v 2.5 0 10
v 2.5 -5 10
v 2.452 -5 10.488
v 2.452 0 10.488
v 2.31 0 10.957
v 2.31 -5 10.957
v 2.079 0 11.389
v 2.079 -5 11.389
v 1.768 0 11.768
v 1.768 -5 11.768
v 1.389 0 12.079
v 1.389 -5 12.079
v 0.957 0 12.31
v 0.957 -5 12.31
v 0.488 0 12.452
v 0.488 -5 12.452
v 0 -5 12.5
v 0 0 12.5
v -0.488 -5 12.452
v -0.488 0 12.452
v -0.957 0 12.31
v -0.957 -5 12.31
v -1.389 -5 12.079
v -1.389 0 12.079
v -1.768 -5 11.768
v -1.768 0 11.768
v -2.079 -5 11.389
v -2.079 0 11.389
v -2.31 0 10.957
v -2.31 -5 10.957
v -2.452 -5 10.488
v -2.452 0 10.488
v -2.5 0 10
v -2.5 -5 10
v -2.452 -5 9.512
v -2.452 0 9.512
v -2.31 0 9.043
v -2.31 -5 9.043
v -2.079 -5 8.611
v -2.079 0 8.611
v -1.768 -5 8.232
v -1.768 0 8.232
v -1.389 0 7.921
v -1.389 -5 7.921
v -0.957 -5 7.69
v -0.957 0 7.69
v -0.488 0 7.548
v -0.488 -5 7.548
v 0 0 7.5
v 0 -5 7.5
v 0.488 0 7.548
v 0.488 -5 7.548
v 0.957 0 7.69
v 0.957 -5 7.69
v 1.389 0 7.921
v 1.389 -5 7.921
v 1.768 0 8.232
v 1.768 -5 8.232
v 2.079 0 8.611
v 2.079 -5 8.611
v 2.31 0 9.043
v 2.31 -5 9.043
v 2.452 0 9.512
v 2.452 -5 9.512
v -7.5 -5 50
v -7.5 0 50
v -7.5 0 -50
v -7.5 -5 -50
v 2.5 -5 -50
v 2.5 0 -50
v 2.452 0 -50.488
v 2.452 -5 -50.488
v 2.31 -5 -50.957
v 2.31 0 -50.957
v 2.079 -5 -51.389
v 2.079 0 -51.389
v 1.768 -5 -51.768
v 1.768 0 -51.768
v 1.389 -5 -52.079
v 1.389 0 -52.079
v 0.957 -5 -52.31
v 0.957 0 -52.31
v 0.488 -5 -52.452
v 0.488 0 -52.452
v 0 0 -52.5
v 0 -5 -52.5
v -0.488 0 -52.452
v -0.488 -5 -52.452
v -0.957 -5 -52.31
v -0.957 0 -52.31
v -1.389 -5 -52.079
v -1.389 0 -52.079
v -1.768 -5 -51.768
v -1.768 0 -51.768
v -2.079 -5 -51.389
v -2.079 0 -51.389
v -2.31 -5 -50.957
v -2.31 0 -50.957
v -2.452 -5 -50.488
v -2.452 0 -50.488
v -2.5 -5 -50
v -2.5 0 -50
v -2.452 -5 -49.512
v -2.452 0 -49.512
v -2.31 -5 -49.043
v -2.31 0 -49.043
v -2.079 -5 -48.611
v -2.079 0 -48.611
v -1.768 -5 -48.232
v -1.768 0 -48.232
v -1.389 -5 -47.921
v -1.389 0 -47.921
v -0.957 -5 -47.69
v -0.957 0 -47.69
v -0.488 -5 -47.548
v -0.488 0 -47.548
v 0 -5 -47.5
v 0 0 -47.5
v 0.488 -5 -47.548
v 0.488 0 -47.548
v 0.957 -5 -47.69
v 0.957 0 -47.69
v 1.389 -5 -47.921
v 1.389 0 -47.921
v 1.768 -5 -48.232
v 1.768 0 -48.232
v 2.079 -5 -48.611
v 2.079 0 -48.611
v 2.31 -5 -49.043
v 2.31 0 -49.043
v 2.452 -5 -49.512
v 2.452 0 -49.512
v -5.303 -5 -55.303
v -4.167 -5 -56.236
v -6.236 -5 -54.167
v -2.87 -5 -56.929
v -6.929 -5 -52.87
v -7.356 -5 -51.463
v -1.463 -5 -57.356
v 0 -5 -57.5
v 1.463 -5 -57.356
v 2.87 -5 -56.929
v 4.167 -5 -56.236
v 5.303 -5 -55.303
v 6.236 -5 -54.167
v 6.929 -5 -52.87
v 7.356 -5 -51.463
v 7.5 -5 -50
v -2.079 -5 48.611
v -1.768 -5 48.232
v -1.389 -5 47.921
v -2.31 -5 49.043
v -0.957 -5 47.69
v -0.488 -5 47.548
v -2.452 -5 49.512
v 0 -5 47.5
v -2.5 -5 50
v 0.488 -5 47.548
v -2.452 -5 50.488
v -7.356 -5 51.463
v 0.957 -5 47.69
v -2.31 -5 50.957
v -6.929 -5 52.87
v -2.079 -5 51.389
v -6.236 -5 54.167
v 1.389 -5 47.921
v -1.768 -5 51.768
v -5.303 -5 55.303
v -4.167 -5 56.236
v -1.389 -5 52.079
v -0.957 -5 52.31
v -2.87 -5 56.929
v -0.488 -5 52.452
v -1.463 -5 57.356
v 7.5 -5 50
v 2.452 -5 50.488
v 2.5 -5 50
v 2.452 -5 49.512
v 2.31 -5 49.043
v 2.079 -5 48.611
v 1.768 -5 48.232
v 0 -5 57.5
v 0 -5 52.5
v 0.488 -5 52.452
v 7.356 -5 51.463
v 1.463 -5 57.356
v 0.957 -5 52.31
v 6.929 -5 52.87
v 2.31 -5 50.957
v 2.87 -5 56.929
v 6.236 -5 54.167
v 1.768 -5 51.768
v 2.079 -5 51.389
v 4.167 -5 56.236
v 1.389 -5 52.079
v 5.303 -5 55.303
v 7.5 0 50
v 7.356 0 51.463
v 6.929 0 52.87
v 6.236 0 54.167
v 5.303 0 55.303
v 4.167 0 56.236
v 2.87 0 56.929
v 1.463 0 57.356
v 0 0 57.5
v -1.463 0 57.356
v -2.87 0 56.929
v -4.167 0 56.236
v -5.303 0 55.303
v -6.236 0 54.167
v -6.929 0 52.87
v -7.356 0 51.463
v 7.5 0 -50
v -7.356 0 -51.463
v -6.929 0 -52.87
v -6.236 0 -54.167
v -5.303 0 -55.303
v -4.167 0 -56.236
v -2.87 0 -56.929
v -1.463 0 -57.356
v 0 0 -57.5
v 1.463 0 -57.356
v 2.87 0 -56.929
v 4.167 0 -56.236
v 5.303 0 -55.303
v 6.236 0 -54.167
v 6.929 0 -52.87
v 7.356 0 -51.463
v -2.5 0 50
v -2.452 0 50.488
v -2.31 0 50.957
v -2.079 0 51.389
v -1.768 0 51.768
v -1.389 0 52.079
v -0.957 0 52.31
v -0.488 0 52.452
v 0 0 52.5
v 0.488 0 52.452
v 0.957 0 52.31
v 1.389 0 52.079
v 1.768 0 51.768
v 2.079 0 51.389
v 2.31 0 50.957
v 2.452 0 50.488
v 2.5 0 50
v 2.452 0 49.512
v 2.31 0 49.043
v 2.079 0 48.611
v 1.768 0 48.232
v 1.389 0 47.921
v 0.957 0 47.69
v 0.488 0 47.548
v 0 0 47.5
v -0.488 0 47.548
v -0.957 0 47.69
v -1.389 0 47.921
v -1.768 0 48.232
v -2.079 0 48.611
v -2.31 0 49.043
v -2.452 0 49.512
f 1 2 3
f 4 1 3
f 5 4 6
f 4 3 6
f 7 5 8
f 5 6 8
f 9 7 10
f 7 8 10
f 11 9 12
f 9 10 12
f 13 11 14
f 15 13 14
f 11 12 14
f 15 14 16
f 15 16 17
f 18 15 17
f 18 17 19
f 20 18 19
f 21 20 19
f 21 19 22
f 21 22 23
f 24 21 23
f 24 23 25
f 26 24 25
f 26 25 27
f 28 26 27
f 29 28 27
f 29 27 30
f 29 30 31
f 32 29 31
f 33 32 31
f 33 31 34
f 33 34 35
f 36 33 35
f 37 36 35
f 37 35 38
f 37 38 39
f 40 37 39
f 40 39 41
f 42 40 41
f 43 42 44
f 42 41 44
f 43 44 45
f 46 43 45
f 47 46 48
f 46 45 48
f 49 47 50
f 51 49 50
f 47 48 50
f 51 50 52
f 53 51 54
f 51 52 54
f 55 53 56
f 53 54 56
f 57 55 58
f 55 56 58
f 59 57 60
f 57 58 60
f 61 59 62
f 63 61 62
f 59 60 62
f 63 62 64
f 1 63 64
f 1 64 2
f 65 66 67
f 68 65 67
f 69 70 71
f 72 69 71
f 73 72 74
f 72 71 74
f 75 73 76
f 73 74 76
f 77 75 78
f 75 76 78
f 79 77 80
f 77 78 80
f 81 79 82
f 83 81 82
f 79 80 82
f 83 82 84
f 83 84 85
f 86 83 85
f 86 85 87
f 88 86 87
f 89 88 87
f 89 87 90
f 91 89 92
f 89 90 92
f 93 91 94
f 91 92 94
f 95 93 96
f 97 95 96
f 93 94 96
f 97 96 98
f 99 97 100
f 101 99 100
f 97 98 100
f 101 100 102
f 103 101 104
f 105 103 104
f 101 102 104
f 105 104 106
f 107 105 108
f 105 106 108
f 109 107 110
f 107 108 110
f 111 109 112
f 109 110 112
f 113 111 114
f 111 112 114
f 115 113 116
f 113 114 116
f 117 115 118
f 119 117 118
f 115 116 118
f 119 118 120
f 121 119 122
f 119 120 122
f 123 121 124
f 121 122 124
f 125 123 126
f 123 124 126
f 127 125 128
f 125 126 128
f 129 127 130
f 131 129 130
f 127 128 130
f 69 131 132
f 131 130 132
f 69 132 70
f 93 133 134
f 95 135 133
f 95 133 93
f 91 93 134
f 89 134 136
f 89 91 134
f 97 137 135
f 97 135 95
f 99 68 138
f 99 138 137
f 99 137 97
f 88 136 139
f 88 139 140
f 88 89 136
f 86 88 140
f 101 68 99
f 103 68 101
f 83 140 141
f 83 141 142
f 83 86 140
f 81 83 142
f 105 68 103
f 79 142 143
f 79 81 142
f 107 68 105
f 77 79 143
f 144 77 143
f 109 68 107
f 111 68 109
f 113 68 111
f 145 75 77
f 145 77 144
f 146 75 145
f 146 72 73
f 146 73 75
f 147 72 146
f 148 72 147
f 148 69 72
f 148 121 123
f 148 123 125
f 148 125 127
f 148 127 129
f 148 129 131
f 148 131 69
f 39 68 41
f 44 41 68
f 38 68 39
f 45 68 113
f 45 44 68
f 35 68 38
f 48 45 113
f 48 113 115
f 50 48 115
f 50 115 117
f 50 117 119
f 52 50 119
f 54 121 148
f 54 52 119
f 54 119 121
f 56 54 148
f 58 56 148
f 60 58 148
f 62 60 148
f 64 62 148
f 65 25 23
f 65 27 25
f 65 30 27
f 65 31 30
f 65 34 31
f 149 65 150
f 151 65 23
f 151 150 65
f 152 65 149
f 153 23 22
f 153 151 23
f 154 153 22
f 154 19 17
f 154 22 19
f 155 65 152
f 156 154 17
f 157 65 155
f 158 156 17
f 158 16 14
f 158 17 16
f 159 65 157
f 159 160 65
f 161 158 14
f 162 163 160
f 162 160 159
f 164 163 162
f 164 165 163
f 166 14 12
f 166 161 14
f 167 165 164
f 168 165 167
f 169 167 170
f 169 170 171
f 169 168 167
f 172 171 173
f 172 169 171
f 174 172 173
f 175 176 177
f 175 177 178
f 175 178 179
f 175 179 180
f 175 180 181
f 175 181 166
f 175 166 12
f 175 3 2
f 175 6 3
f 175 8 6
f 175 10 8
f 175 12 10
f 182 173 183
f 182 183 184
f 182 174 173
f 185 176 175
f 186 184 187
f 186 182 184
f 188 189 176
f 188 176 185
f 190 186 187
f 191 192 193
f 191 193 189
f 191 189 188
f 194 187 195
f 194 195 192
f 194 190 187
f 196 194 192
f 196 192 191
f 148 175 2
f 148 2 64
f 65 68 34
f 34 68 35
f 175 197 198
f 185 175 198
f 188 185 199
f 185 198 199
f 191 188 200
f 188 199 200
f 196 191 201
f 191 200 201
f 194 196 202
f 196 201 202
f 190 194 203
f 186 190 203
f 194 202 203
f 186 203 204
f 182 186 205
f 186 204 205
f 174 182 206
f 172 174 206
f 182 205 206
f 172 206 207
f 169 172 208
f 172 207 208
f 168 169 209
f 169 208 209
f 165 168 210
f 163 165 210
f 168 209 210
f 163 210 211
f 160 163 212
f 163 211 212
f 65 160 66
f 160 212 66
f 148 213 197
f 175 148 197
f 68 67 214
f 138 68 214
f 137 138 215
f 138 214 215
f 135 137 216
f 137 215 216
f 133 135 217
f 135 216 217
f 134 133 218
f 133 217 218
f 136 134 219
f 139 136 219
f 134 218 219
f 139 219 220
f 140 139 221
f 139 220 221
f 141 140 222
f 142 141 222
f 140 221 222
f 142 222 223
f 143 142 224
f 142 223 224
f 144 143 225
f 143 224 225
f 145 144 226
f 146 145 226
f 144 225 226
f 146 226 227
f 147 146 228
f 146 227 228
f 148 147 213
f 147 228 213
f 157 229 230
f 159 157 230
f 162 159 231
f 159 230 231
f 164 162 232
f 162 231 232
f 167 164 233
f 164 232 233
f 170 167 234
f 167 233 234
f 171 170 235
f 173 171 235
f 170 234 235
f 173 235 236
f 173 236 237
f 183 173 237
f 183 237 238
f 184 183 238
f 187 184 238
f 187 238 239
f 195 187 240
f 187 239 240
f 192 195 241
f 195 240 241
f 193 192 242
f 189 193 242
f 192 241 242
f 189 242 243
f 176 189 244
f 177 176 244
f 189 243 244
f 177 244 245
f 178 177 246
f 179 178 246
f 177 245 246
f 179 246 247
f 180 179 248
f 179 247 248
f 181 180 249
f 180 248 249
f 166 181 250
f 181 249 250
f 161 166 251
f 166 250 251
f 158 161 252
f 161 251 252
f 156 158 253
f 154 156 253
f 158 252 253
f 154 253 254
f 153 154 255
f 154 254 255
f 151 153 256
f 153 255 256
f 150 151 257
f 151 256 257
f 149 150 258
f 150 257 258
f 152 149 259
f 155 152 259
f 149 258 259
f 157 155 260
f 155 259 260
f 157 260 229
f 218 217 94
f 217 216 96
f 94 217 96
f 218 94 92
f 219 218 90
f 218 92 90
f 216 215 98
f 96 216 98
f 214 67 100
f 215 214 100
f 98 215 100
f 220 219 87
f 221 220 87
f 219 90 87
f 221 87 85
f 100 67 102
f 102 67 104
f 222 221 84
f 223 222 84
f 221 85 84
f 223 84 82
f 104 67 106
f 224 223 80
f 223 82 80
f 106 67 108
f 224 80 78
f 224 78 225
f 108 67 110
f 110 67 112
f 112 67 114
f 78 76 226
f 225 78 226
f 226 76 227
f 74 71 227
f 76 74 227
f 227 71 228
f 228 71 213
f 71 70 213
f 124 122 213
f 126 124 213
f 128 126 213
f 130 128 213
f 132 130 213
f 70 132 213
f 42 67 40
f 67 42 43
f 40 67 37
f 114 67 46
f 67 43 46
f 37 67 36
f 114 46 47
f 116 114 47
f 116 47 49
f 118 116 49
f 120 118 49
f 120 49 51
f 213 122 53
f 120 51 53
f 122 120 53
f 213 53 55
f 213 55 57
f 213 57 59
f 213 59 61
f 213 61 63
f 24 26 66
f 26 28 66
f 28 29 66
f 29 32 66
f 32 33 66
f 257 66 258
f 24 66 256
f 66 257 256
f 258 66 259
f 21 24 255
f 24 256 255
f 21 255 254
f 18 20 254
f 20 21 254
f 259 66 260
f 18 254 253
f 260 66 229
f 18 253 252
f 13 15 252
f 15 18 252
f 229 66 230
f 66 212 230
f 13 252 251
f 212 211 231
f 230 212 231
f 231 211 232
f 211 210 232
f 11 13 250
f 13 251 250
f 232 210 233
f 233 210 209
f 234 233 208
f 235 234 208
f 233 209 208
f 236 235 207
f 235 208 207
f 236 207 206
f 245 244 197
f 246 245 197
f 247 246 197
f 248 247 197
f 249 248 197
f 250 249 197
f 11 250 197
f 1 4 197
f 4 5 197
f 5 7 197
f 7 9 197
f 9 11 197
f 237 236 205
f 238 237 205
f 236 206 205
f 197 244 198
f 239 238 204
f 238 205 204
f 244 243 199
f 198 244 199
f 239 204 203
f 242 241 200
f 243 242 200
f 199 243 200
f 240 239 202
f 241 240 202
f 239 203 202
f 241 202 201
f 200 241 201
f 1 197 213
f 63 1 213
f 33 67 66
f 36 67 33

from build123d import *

# Parameters (mm, degrees)
F1_DEPTH = 5
F2_R     = 2.5
F3_DEPTH = 5.001


with BuildPart() as f1:
    # F0 (on Front) → F1 (new body)
    with BuildSketch(Plane.XZ):
        with BuildLine():
            Line((7.5, -50), (7.5, 50))
            Line((7.5, 50), (2.5, 50))
            ThreePointArc((2.5, 50), (0, 47.5), (-2.5, 50))
            Line((-2.5, 50), (-7.5, 50))
            Line((-7.5, 50), (-7.5, -50))
            Line((-7.5, -50), (-2.5, -50))
            ThreePointArc((-2.5, -50), (0, -47.5), (2.5, -50))
            Line((2.5, -50), (7.5, -50))
        make_face()
        with BuildLine():
            Line((2.5, 50), (7.5, 50))
            ThreePointArc((7.5, 50), (0, 57.5), (-7.5, 50))
            Line((-7.5, 50), (-2.5, 50))
            ThreePointArc((-2.5, 50), (0, 52.5), (2.5, 50))
        make_face()
        with BuildLine():
            ThreePointArc((-7.5, -50), (0, -57.5), (7.5, -50))
            Line((7.5, -50), (2.5, -50))
            ThreePointArc((2.5, -50), (0, -52.5), (-2.5, -50))
            Line((-2.5, -50), (-7.5, -50))
        make_face()
    extrude(amount=F1_DEPTH)

    # F2 (on face) → F3 (cut, through all)
    with BuildSketch(Plane.XZ.offset(5)):
        with Locations((0, 10)):
            Circle(F2_R)
    extrude(amount=-F3_DEPTH, mode=Mode.SUBTRACT)


solid = f1.part
